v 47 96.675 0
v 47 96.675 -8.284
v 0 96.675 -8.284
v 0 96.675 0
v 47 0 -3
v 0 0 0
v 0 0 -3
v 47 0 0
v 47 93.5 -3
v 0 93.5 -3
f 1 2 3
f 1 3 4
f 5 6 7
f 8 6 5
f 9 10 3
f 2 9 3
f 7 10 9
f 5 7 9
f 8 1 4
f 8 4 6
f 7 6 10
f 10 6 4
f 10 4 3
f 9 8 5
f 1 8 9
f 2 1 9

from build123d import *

# Parameters (mm, degrees)
ESQUISSE1_W        = 47
ESQUISSE1_H        = 93.5
BOSS_EXTRU_1_DEPTH = 3
BOSS_EXTRU_2_DEPTH = 47


with BuildPart() as part:
    # Esquisse1 → Boss.-Extru.1 (new body)
    with BuildSketch(Plane.XY):
        with Locations((23.5, 46.75)):
            Rectangle(ESQUISSE1_W, ESQUISSE1_H)
    extrude(amount=-BOSS_EXTRU_1_DEPTH)

    # Esquisse2 → Boss.-Extru.2 (add)
    with BuildSketch(Plane(origin=(47, 0, 0), x_dir=(0, 0, -1), z_dir=(1, 0, 0))):
        Polygon((3, 93.5), (8.284087356, 96.675), (0, 96.675), (0, 93.5), align=None)
    extrude(amount=-BOSS_EXTRU_2_DEPTH)


solid = part.part
